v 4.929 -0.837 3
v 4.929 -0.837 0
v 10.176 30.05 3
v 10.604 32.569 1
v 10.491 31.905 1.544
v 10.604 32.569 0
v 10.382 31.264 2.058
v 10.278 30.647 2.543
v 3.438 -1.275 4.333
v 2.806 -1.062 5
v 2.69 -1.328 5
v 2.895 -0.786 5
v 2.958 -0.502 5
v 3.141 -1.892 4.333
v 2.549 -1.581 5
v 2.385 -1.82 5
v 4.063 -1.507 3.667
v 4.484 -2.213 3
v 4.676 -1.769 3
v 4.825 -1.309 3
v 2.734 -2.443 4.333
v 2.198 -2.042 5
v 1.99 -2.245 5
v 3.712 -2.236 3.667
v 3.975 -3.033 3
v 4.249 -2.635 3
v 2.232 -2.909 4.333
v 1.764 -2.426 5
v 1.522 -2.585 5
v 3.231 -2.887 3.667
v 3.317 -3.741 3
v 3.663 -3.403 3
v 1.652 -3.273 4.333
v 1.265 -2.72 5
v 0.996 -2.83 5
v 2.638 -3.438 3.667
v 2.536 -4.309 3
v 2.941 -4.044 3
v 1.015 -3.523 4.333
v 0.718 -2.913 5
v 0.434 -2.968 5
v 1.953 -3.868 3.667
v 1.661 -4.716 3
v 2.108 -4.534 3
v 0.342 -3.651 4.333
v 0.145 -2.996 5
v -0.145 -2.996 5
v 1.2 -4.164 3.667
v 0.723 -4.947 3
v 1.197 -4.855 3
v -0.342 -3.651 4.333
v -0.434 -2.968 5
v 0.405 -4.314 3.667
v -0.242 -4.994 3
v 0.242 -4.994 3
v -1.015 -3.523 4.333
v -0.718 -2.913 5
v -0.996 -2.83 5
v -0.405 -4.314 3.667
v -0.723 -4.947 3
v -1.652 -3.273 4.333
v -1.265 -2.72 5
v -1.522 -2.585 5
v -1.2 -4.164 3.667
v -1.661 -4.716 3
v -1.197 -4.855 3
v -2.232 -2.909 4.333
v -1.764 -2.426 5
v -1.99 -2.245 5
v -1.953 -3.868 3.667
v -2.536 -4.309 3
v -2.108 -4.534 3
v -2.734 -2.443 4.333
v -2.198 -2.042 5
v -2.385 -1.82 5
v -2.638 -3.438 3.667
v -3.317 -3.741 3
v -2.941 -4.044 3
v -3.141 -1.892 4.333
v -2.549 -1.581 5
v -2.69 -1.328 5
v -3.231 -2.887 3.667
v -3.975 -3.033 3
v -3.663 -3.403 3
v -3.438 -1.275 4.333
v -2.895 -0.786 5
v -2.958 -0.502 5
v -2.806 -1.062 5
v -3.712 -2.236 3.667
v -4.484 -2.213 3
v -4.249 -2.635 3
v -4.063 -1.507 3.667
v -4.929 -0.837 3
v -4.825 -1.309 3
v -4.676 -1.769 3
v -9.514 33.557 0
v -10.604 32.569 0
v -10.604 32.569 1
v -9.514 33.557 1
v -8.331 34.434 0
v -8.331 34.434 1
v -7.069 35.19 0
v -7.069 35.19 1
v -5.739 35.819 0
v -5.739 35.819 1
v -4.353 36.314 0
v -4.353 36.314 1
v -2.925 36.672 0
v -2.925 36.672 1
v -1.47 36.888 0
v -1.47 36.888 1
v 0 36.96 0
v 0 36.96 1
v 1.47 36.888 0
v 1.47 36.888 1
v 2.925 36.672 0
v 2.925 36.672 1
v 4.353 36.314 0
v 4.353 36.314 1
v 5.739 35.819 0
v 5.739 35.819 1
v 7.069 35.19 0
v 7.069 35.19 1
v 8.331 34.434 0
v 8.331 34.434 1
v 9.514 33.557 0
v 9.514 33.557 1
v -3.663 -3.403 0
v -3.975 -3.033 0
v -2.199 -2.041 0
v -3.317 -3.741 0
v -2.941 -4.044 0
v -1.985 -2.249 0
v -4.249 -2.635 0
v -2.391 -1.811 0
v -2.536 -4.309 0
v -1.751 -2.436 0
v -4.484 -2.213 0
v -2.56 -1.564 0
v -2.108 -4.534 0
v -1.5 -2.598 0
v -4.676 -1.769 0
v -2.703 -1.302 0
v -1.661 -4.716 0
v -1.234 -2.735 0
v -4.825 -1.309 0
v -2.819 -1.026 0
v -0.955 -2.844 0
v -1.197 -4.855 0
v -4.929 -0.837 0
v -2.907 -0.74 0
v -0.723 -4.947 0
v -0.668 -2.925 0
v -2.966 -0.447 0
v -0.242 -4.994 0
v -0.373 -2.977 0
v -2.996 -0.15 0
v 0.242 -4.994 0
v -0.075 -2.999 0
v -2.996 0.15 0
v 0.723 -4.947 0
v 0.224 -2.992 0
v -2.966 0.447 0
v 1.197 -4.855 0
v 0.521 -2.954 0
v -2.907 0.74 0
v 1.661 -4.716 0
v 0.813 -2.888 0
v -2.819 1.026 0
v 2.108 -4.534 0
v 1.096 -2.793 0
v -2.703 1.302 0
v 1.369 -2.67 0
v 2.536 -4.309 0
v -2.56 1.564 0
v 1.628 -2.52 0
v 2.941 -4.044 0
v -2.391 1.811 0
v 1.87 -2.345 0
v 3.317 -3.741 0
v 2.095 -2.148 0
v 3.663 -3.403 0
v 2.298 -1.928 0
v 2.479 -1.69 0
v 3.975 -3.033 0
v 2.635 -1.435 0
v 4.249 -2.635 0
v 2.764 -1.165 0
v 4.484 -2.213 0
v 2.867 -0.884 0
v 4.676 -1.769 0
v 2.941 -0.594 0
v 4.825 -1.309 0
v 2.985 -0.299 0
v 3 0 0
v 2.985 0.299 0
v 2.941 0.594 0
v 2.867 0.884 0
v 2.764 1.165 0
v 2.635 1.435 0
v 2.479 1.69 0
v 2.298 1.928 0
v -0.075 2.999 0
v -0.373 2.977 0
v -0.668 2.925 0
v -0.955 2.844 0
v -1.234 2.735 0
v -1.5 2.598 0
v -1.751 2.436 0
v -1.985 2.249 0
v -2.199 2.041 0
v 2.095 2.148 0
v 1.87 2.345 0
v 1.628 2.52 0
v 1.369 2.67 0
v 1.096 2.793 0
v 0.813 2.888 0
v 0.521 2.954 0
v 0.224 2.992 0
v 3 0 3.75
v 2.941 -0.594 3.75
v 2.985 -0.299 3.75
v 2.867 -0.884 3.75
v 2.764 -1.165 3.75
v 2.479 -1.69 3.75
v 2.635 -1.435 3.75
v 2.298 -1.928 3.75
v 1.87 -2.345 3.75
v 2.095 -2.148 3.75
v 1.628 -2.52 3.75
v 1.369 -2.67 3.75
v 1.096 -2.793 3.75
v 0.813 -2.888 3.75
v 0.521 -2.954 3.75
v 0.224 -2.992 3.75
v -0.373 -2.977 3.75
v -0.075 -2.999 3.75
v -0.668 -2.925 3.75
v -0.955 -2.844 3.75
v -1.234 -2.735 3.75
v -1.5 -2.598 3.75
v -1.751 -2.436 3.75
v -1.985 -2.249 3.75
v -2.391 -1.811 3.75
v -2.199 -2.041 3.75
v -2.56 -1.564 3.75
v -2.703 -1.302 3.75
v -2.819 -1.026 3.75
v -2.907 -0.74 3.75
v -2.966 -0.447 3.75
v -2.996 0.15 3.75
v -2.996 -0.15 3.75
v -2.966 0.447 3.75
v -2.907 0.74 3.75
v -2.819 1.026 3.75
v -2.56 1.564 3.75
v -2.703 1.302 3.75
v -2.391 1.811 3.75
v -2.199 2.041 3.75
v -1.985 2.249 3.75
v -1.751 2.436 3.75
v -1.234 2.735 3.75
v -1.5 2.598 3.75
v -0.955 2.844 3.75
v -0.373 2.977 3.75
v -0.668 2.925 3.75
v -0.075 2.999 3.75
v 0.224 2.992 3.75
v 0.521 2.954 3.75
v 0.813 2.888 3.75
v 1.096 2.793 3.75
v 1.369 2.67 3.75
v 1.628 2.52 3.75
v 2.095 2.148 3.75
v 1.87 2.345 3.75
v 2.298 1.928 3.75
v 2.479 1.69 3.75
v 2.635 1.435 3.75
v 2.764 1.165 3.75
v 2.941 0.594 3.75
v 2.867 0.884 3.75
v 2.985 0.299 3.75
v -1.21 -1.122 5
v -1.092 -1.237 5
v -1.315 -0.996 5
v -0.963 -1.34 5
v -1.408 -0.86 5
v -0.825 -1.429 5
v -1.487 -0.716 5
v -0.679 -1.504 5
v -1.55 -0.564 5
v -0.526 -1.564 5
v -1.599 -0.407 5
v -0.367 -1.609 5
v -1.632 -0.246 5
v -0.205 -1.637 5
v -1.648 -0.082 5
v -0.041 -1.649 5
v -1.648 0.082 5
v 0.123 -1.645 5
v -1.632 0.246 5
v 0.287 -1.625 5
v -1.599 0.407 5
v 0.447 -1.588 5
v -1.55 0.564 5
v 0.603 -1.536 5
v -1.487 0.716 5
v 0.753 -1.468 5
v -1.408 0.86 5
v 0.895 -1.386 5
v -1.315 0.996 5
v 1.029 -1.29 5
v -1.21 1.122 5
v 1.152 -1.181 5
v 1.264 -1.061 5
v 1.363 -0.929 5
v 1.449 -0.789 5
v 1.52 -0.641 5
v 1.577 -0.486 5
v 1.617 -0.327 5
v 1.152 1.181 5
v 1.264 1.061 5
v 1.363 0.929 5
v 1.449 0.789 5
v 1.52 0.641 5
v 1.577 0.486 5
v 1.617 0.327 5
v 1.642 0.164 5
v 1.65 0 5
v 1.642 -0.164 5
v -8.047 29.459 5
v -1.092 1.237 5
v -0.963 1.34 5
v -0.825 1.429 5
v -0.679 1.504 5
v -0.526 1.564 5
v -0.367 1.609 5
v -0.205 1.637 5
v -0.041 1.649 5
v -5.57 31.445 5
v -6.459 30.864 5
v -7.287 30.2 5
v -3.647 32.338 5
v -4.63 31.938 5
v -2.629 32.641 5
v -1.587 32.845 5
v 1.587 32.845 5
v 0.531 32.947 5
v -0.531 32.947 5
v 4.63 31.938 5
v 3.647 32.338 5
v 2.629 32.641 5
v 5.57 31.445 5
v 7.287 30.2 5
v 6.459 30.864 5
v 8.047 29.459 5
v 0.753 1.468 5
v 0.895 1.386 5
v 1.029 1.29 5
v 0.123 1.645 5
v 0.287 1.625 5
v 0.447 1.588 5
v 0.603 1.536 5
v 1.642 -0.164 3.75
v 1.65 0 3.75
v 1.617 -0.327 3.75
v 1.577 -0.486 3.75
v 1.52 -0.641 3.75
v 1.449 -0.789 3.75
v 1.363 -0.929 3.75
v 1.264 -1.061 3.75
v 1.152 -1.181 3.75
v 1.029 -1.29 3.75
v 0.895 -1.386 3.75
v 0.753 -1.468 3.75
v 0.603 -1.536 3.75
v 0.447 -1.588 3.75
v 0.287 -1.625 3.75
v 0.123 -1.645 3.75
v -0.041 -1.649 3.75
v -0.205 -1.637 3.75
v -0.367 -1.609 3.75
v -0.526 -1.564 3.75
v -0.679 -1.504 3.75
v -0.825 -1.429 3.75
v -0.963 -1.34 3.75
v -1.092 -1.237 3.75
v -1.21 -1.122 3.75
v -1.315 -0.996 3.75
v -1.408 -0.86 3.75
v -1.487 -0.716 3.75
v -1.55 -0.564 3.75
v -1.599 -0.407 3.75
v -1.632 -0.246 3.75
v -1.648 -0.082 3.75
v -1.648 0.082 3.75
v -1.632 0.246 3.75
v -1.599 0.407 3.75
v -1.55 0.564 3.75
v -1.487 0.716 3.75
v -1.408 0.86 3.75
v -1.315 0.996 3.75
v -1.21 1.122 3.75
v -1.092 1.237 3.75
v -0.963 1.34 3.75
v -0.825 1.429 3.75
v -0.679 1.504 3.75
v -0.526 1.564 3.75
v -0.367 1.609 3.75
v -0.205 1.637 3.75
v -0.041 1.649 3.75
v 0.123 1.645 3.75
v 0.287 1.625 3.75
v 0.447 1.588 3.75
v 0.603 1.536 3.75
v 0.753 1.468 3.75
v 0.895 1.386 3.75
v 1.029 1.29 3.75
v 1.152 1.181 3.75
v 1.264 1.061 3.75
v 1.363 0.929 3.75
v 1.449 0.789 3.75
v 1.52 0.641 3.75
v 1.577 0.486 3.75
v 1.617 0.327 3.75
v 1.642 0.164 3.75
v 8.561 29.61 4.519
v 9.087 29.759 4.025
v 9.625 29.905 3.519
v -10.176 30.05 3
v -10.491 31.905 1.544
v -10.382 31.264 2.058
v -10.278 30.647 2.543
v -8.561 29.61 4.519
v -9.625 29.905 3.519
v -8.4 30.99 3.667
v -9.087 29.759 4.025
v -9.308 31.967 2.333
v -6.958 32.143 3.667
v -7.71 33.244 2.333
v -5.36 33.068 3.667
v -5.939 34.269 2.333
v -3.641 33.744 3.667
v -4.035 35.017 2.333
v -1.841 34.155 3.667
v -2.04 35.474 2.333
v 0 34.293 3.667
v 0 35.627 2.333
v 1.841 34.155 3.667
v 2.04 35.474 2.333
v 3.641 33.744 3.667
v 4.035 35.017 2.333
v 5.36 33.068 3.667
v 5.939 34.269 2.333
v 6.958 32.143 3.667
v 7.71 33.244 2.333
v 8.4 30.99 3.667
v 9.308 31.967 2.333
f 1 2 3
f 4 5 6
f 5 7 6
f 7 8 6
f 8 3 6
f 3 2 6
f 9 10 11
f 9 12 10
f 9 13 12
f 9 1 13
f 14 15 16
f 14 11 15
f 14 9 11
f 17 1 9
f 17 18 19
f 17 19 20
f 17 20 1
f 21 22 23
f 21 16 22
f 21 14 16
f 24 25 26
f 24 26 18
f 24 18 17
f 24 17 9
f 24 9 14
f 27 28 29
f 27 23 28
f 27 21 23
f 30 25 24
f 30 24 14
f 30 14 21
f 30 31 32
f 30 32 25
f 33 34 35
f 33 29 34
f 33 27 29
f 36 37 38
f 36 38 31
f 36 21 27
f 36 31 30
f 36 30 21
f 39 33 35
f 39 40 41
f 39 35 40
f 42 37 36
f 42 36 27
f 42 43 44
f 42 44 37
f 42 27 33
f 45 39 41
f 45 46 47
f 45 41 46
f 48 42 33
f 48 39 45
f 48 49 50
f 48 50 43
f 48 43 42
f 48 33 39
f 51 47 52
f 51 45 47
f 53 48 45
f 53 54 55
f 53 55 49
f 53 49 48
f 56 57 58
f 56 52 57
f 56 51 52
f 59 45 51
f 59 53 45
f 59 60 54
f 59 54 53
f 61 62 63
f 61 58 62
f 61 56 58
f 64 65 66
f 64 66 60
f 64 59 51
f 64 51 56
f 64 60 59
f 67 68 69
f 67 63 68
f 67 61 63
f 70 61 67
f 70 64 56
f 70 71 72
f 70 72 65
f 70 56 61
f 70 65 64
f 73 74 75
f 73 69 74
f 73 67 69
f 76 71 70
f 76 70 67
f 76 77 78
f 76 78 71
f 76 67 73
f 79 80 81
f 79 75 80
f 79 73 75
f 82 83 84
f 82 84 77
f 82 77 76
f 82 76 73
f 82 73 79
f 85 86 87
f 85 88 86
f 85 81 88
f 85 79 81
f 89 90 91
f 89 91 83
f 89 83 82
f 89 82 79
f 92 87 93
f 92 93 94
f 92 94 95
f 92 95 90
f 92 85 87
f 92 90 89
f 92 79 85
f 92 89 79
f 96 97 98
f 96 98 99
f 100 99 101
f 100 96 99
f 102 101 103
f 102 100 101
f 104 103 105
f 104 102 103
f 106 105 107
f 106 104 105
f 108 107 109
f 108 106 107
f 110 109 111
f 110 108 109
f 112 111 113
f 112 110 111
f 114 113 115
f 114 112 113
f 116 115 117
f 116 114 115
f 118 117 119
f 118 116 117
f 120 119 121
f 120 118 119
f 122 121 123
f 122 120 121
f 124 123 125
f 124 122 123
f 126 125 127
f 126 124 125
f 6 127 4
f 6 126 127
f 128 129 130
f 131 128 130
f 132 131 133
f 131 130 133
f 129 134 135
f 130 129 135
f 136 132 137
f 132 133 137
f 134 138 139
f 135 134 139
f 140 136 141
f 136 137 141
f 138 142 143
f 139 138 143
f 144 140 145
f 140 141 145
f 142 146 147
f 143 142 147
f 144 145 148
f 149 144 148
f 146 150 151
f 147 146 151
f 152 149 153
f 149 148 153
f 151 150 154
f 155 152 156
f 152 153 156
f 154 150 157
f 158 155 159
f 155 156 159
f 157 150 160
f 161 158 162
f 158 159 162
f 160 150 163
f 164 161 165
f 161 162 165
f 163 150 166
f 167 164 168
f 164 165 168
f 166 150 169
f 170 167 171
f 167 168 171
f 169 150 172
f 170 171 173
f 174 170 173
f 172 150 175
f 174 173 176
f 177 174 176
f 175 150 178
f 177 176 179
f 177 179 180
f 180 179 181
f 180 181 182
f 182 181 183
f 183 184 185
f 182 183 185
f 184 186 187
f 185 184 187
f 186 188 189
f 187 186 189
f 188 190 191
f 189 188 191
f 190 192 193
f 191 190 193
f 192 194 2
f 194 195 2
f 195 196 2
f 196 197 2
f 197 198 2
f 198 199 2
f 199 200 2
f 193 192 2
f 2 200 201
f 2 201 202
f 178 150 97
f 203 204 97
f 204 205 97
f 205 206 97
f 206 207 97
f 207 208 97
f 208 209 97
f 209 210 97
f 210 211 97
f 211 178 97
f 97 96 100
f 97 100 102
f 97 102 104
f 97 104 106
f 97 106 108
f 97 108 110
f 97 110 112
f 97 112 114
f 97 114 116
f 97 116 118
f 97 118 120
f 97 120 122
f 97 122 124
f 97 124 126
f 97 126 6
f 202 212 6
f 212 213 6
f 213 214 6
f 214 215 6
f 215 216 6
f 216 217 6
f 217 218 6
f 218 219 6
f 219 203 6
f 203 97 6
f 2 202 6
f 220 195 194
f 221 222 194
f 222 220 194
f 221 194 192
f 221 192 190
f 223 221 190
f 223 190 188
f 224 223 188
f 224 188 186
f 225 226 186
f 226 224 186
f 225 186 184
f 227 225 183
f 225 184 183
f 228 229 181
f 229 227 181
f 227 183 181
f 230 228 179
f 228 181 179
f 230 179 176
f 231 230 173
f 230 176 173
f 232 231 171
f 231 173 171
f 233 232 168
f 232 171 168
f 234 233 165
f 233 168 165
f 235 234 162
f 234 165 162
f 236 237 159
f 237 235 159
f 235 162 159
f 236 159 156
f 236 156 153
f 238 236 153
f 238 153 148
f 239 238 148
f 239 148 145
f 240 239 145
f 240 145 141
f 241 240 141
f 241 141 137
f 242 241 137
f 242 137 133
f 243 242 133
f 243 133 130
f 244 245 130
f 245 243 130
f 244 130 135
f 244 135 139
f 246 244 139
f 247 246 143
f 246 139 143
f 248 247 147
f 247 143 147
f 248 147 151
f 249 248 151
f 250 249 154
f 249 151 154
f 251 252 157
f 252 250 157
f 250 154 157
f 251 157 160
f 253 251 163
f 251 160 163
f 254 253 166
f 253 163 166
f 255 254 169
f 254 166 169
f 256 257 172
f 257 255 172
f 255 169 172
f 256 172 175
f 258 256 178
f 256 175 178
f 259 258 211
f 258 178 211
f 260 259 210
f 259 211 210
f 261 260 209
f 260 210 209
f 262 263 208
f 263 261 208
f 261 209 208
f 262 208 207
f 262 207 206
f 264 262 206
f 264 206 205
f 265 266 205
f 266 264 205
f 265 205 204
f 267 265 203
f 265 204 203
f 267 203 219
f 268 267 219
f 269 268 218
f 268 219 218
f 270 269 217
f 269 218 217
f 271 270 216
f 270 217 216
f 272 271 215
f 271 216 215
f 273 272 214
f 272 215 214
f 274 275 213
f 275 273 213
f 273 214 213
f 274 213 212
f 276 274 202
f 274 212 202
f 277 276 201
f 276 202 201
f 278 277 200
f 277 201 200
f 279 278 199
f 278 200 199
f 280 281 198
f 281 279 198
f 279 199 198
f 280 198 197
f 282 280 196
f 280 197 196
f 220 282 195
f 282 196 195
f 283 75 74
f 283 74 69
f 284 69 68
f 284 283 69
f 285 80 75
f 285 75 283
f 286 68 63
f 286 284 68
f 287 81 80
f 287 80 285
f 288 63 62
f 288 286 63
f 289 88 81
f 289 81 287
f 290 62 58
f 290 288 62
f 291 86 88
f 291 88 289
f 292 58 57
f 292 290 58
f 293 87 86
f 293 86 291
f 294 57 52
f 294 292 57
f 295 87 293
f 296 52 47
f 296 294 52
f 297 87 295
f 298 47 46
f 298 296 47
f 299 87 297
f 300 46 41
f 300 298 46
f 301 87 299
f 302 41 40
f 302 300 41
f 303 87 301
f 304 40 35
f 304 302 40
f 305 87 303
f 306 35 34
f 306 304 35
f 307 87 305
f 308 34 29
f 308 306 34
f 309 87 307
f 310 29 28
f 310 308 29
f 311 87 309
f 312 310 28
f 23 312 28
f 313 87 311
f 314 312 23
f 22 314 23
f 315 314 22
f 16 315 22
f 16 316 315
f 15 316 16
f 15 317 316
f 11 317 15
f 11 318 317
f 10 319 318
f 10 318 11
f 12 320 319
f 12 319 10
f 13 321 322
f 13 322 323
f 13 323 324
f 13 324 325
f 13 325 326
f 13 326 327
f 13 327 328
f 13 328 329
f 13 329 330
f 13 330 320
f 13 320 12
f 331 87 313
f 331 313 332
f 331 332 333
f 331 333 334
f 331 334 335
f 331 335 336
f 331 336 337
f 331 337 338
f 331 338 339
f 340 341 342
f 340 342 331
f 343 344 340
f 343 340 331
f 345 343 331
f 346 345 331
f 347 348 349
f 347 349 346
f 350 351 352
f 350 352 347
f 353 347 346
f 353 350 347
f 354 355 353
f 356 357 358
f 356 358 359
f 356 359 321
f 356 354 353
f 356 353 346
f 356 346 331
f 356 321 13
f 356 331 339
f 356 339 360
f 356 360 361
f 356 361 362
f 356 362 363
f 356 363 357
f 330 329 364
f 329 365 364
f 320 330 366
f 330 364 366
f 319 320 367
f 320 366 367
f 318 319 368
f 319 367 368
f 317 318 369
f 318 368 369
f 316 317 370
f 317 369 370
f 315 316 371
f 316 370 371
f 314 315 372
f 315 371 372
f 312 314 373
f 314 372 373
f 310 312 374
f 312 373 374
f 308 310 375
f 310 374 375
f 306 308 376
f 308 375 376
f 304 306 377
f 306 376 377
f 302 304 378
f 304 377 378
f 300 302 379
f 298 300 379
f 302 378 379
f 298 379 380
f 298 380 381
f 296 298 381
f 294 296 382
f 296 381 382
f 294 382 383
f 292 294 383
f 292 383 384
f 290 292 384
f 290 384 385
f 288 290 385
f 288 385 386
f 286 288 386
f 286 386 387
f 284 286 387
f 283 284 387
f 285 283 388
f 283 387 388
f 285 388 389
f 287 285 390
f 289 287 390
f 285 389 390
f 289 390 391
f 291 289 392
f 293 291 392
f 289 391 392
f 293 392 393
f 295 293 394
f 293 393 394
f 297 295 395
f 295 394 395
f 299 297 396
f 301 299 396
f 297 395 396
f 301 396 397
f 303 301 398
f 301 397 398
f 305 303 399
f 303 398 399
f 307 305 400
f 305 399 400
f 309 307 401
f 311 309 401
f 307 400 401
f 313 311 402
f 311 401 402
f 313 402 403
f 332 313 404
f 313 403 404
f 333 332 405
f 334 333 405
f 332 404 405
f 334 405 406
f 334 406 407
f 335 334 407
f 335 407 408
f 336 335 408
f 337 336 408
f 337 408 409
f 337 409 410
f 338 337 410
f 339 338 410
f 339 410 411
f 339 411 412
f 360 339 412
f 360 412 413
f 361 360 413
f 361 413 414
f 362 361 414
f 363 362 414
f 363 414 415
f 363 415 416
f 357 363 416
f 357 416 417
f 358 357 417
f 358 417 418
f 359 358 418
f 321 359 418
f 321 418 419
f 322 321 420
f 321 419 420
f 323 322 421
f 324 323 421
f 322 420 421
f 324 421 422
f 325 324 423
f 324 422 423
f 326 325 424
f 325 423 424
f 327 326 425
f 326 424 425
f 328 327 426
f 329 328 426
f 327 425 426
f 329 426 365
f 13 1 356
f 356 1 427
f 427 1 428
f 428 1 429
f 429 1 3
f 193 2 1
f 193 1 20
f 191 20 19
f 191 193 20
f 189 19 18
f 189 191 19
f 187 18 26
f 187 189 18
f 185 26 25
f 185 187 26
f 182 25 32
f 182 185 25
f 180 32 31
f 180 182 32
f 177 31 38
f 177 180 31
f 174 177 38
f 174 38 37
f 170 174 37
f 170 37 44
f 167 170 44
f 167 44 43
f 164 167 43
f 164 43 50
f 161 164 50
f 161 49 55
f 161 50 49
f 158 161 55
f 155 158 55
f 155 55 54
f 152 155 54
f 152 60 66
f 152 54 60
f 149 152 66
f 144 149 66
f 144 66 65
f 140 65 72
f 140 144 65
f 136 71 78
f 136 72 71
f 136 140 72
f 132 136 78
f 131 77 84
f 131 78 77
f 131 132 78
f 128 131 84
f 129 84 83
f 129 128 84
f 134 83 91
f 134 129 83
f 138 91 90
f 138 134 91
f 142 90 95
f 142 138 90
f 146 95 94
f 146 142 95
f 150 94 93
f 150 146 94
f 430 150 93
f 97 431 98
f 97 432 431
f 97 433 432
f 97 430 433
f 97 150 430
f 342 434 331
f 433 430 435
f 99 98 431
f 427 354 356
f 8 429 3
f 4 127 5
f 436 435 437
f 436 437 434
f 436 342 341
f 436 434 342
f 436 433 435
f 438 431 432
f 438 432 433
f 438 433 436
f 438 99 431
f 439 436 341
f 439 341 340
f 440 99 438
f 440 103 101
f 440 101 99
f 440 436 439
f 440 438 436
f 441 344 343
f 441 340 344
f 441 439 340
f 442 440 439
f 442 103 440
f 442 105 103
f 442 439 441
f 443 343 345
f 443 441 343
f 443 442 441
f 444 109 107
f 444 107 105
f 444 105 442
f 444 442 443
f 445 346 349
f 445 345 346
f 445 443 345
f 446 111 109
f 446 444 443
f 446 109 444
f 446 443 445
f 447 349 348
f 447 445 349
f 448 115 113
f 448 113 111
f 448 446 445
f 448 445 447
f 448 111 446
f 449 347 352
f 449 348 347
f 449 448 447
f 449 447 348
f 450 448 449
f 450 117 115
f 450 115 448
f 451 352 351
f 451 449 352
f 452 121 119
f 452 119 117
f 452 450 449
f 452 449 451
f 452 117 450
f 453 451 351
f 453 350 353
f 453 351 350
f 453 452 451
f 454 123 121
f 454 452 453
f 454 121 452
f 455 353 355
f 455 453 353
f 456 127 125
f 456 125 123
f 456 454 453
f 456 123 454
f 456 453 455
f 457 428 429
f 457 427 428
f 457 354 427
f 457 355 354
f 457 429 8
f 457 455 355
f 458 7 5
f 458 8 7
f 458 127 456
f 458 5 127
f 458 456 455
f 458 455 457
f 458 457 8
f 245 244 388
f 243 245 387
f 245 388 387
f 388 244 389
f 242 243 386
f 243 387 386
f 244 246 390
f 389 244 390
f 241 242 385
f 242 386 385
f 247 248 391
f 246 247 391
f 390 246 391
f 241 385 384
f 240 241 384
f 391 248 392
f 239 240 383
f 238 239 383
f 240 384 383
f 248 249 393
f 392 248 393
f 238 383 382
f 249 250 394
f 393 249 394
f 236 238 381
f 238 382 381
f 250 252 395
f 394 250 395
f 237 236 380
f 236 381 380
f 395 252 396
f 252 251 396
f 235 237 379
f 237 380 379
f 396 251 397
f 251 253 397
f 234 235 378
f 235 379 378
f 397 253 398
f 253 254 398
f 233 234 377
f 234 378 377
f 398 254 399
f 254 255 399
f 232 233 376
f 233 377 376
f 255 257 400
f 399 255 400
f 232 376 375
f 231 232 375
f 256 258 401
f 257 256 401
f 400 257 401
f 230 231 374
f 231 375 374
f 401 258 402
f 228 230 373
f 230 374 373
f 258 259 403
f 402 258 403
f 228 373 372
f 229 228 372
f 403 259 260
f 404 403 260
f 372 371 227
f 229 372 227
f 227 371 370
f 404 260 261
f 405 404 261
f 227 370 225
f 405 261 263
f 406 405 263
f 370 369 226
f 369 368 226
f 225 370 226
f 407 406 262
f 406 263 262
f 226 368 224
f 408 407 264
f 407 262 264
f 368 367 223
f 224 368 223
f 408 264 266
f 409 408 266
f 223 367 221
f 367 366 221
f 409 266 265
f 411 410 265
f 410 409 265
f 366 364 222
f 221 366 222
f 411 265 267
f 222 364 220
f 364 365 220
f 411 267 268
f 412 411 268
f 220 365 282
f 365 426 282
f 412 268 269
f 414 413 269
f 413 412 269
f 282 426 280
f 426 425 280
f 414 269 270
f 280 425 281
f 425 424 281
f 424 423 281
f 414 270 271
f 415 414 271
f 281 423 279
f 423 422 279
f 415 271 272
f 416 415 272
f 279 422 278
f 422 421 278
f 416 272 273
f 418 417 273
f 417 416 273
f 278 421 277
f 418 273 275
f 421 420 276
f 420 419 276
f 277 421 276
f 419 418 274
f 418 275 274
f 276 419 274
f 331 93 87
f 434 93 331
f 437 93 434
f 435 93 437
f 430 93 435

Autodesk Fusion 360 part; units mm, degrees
sketch "Esboço1" plane through (0, 0, 0) normal (0, 0, 1) x (1, 0, 0)
  line L0 (0, 5) -> (0, 6.96) construction
  line L1 (-4.9294, -0.8373) -> (-10.6041, 32.5691)
  line L2 (4.9294, -0.8373) -> (10.6041, 32.5691)
  arc A0 (10.6041, 32.5691) -> (-10.6041, 32.5691) centre (0, 21.96) ccw
  arc A1 (-4.9294, -0.8373) -> (4.9294, -0.8373) centre (0, 0) ccw
  circle A2 centre (0, 0) radius 3
  circle A3 centre (0, 0) radius 1.65
  dimension "d1" = 10
  dimension "d2" = 21.96
  dimension "d3" = 30
  dimension "d4" = 33.885
  dimension "d5" = 33.885
  dimension "d8" = 6
  dimension "d9" = 3.3
extrude "Extrusão1" add sketch "Esboço1" along normal blind 5 contours L1 L2 A0 A1 | A2 | A3
extrude "Extrusão2" cut sketch "Esboço1" along normal blind 28 contours A3
extrude "Extrusão3" cut sketch "Esboço1" along normal blind 3.75 contours A2
chamfer "Chanfro1" distance 2 angle 45 2 edges at (7.7667, 15.8659, 5) (-7.7667, 15.8659, 5)
chamfer "Chanfro2" distance 4 angle 45 1 edges at (0, 36.96, 5)
